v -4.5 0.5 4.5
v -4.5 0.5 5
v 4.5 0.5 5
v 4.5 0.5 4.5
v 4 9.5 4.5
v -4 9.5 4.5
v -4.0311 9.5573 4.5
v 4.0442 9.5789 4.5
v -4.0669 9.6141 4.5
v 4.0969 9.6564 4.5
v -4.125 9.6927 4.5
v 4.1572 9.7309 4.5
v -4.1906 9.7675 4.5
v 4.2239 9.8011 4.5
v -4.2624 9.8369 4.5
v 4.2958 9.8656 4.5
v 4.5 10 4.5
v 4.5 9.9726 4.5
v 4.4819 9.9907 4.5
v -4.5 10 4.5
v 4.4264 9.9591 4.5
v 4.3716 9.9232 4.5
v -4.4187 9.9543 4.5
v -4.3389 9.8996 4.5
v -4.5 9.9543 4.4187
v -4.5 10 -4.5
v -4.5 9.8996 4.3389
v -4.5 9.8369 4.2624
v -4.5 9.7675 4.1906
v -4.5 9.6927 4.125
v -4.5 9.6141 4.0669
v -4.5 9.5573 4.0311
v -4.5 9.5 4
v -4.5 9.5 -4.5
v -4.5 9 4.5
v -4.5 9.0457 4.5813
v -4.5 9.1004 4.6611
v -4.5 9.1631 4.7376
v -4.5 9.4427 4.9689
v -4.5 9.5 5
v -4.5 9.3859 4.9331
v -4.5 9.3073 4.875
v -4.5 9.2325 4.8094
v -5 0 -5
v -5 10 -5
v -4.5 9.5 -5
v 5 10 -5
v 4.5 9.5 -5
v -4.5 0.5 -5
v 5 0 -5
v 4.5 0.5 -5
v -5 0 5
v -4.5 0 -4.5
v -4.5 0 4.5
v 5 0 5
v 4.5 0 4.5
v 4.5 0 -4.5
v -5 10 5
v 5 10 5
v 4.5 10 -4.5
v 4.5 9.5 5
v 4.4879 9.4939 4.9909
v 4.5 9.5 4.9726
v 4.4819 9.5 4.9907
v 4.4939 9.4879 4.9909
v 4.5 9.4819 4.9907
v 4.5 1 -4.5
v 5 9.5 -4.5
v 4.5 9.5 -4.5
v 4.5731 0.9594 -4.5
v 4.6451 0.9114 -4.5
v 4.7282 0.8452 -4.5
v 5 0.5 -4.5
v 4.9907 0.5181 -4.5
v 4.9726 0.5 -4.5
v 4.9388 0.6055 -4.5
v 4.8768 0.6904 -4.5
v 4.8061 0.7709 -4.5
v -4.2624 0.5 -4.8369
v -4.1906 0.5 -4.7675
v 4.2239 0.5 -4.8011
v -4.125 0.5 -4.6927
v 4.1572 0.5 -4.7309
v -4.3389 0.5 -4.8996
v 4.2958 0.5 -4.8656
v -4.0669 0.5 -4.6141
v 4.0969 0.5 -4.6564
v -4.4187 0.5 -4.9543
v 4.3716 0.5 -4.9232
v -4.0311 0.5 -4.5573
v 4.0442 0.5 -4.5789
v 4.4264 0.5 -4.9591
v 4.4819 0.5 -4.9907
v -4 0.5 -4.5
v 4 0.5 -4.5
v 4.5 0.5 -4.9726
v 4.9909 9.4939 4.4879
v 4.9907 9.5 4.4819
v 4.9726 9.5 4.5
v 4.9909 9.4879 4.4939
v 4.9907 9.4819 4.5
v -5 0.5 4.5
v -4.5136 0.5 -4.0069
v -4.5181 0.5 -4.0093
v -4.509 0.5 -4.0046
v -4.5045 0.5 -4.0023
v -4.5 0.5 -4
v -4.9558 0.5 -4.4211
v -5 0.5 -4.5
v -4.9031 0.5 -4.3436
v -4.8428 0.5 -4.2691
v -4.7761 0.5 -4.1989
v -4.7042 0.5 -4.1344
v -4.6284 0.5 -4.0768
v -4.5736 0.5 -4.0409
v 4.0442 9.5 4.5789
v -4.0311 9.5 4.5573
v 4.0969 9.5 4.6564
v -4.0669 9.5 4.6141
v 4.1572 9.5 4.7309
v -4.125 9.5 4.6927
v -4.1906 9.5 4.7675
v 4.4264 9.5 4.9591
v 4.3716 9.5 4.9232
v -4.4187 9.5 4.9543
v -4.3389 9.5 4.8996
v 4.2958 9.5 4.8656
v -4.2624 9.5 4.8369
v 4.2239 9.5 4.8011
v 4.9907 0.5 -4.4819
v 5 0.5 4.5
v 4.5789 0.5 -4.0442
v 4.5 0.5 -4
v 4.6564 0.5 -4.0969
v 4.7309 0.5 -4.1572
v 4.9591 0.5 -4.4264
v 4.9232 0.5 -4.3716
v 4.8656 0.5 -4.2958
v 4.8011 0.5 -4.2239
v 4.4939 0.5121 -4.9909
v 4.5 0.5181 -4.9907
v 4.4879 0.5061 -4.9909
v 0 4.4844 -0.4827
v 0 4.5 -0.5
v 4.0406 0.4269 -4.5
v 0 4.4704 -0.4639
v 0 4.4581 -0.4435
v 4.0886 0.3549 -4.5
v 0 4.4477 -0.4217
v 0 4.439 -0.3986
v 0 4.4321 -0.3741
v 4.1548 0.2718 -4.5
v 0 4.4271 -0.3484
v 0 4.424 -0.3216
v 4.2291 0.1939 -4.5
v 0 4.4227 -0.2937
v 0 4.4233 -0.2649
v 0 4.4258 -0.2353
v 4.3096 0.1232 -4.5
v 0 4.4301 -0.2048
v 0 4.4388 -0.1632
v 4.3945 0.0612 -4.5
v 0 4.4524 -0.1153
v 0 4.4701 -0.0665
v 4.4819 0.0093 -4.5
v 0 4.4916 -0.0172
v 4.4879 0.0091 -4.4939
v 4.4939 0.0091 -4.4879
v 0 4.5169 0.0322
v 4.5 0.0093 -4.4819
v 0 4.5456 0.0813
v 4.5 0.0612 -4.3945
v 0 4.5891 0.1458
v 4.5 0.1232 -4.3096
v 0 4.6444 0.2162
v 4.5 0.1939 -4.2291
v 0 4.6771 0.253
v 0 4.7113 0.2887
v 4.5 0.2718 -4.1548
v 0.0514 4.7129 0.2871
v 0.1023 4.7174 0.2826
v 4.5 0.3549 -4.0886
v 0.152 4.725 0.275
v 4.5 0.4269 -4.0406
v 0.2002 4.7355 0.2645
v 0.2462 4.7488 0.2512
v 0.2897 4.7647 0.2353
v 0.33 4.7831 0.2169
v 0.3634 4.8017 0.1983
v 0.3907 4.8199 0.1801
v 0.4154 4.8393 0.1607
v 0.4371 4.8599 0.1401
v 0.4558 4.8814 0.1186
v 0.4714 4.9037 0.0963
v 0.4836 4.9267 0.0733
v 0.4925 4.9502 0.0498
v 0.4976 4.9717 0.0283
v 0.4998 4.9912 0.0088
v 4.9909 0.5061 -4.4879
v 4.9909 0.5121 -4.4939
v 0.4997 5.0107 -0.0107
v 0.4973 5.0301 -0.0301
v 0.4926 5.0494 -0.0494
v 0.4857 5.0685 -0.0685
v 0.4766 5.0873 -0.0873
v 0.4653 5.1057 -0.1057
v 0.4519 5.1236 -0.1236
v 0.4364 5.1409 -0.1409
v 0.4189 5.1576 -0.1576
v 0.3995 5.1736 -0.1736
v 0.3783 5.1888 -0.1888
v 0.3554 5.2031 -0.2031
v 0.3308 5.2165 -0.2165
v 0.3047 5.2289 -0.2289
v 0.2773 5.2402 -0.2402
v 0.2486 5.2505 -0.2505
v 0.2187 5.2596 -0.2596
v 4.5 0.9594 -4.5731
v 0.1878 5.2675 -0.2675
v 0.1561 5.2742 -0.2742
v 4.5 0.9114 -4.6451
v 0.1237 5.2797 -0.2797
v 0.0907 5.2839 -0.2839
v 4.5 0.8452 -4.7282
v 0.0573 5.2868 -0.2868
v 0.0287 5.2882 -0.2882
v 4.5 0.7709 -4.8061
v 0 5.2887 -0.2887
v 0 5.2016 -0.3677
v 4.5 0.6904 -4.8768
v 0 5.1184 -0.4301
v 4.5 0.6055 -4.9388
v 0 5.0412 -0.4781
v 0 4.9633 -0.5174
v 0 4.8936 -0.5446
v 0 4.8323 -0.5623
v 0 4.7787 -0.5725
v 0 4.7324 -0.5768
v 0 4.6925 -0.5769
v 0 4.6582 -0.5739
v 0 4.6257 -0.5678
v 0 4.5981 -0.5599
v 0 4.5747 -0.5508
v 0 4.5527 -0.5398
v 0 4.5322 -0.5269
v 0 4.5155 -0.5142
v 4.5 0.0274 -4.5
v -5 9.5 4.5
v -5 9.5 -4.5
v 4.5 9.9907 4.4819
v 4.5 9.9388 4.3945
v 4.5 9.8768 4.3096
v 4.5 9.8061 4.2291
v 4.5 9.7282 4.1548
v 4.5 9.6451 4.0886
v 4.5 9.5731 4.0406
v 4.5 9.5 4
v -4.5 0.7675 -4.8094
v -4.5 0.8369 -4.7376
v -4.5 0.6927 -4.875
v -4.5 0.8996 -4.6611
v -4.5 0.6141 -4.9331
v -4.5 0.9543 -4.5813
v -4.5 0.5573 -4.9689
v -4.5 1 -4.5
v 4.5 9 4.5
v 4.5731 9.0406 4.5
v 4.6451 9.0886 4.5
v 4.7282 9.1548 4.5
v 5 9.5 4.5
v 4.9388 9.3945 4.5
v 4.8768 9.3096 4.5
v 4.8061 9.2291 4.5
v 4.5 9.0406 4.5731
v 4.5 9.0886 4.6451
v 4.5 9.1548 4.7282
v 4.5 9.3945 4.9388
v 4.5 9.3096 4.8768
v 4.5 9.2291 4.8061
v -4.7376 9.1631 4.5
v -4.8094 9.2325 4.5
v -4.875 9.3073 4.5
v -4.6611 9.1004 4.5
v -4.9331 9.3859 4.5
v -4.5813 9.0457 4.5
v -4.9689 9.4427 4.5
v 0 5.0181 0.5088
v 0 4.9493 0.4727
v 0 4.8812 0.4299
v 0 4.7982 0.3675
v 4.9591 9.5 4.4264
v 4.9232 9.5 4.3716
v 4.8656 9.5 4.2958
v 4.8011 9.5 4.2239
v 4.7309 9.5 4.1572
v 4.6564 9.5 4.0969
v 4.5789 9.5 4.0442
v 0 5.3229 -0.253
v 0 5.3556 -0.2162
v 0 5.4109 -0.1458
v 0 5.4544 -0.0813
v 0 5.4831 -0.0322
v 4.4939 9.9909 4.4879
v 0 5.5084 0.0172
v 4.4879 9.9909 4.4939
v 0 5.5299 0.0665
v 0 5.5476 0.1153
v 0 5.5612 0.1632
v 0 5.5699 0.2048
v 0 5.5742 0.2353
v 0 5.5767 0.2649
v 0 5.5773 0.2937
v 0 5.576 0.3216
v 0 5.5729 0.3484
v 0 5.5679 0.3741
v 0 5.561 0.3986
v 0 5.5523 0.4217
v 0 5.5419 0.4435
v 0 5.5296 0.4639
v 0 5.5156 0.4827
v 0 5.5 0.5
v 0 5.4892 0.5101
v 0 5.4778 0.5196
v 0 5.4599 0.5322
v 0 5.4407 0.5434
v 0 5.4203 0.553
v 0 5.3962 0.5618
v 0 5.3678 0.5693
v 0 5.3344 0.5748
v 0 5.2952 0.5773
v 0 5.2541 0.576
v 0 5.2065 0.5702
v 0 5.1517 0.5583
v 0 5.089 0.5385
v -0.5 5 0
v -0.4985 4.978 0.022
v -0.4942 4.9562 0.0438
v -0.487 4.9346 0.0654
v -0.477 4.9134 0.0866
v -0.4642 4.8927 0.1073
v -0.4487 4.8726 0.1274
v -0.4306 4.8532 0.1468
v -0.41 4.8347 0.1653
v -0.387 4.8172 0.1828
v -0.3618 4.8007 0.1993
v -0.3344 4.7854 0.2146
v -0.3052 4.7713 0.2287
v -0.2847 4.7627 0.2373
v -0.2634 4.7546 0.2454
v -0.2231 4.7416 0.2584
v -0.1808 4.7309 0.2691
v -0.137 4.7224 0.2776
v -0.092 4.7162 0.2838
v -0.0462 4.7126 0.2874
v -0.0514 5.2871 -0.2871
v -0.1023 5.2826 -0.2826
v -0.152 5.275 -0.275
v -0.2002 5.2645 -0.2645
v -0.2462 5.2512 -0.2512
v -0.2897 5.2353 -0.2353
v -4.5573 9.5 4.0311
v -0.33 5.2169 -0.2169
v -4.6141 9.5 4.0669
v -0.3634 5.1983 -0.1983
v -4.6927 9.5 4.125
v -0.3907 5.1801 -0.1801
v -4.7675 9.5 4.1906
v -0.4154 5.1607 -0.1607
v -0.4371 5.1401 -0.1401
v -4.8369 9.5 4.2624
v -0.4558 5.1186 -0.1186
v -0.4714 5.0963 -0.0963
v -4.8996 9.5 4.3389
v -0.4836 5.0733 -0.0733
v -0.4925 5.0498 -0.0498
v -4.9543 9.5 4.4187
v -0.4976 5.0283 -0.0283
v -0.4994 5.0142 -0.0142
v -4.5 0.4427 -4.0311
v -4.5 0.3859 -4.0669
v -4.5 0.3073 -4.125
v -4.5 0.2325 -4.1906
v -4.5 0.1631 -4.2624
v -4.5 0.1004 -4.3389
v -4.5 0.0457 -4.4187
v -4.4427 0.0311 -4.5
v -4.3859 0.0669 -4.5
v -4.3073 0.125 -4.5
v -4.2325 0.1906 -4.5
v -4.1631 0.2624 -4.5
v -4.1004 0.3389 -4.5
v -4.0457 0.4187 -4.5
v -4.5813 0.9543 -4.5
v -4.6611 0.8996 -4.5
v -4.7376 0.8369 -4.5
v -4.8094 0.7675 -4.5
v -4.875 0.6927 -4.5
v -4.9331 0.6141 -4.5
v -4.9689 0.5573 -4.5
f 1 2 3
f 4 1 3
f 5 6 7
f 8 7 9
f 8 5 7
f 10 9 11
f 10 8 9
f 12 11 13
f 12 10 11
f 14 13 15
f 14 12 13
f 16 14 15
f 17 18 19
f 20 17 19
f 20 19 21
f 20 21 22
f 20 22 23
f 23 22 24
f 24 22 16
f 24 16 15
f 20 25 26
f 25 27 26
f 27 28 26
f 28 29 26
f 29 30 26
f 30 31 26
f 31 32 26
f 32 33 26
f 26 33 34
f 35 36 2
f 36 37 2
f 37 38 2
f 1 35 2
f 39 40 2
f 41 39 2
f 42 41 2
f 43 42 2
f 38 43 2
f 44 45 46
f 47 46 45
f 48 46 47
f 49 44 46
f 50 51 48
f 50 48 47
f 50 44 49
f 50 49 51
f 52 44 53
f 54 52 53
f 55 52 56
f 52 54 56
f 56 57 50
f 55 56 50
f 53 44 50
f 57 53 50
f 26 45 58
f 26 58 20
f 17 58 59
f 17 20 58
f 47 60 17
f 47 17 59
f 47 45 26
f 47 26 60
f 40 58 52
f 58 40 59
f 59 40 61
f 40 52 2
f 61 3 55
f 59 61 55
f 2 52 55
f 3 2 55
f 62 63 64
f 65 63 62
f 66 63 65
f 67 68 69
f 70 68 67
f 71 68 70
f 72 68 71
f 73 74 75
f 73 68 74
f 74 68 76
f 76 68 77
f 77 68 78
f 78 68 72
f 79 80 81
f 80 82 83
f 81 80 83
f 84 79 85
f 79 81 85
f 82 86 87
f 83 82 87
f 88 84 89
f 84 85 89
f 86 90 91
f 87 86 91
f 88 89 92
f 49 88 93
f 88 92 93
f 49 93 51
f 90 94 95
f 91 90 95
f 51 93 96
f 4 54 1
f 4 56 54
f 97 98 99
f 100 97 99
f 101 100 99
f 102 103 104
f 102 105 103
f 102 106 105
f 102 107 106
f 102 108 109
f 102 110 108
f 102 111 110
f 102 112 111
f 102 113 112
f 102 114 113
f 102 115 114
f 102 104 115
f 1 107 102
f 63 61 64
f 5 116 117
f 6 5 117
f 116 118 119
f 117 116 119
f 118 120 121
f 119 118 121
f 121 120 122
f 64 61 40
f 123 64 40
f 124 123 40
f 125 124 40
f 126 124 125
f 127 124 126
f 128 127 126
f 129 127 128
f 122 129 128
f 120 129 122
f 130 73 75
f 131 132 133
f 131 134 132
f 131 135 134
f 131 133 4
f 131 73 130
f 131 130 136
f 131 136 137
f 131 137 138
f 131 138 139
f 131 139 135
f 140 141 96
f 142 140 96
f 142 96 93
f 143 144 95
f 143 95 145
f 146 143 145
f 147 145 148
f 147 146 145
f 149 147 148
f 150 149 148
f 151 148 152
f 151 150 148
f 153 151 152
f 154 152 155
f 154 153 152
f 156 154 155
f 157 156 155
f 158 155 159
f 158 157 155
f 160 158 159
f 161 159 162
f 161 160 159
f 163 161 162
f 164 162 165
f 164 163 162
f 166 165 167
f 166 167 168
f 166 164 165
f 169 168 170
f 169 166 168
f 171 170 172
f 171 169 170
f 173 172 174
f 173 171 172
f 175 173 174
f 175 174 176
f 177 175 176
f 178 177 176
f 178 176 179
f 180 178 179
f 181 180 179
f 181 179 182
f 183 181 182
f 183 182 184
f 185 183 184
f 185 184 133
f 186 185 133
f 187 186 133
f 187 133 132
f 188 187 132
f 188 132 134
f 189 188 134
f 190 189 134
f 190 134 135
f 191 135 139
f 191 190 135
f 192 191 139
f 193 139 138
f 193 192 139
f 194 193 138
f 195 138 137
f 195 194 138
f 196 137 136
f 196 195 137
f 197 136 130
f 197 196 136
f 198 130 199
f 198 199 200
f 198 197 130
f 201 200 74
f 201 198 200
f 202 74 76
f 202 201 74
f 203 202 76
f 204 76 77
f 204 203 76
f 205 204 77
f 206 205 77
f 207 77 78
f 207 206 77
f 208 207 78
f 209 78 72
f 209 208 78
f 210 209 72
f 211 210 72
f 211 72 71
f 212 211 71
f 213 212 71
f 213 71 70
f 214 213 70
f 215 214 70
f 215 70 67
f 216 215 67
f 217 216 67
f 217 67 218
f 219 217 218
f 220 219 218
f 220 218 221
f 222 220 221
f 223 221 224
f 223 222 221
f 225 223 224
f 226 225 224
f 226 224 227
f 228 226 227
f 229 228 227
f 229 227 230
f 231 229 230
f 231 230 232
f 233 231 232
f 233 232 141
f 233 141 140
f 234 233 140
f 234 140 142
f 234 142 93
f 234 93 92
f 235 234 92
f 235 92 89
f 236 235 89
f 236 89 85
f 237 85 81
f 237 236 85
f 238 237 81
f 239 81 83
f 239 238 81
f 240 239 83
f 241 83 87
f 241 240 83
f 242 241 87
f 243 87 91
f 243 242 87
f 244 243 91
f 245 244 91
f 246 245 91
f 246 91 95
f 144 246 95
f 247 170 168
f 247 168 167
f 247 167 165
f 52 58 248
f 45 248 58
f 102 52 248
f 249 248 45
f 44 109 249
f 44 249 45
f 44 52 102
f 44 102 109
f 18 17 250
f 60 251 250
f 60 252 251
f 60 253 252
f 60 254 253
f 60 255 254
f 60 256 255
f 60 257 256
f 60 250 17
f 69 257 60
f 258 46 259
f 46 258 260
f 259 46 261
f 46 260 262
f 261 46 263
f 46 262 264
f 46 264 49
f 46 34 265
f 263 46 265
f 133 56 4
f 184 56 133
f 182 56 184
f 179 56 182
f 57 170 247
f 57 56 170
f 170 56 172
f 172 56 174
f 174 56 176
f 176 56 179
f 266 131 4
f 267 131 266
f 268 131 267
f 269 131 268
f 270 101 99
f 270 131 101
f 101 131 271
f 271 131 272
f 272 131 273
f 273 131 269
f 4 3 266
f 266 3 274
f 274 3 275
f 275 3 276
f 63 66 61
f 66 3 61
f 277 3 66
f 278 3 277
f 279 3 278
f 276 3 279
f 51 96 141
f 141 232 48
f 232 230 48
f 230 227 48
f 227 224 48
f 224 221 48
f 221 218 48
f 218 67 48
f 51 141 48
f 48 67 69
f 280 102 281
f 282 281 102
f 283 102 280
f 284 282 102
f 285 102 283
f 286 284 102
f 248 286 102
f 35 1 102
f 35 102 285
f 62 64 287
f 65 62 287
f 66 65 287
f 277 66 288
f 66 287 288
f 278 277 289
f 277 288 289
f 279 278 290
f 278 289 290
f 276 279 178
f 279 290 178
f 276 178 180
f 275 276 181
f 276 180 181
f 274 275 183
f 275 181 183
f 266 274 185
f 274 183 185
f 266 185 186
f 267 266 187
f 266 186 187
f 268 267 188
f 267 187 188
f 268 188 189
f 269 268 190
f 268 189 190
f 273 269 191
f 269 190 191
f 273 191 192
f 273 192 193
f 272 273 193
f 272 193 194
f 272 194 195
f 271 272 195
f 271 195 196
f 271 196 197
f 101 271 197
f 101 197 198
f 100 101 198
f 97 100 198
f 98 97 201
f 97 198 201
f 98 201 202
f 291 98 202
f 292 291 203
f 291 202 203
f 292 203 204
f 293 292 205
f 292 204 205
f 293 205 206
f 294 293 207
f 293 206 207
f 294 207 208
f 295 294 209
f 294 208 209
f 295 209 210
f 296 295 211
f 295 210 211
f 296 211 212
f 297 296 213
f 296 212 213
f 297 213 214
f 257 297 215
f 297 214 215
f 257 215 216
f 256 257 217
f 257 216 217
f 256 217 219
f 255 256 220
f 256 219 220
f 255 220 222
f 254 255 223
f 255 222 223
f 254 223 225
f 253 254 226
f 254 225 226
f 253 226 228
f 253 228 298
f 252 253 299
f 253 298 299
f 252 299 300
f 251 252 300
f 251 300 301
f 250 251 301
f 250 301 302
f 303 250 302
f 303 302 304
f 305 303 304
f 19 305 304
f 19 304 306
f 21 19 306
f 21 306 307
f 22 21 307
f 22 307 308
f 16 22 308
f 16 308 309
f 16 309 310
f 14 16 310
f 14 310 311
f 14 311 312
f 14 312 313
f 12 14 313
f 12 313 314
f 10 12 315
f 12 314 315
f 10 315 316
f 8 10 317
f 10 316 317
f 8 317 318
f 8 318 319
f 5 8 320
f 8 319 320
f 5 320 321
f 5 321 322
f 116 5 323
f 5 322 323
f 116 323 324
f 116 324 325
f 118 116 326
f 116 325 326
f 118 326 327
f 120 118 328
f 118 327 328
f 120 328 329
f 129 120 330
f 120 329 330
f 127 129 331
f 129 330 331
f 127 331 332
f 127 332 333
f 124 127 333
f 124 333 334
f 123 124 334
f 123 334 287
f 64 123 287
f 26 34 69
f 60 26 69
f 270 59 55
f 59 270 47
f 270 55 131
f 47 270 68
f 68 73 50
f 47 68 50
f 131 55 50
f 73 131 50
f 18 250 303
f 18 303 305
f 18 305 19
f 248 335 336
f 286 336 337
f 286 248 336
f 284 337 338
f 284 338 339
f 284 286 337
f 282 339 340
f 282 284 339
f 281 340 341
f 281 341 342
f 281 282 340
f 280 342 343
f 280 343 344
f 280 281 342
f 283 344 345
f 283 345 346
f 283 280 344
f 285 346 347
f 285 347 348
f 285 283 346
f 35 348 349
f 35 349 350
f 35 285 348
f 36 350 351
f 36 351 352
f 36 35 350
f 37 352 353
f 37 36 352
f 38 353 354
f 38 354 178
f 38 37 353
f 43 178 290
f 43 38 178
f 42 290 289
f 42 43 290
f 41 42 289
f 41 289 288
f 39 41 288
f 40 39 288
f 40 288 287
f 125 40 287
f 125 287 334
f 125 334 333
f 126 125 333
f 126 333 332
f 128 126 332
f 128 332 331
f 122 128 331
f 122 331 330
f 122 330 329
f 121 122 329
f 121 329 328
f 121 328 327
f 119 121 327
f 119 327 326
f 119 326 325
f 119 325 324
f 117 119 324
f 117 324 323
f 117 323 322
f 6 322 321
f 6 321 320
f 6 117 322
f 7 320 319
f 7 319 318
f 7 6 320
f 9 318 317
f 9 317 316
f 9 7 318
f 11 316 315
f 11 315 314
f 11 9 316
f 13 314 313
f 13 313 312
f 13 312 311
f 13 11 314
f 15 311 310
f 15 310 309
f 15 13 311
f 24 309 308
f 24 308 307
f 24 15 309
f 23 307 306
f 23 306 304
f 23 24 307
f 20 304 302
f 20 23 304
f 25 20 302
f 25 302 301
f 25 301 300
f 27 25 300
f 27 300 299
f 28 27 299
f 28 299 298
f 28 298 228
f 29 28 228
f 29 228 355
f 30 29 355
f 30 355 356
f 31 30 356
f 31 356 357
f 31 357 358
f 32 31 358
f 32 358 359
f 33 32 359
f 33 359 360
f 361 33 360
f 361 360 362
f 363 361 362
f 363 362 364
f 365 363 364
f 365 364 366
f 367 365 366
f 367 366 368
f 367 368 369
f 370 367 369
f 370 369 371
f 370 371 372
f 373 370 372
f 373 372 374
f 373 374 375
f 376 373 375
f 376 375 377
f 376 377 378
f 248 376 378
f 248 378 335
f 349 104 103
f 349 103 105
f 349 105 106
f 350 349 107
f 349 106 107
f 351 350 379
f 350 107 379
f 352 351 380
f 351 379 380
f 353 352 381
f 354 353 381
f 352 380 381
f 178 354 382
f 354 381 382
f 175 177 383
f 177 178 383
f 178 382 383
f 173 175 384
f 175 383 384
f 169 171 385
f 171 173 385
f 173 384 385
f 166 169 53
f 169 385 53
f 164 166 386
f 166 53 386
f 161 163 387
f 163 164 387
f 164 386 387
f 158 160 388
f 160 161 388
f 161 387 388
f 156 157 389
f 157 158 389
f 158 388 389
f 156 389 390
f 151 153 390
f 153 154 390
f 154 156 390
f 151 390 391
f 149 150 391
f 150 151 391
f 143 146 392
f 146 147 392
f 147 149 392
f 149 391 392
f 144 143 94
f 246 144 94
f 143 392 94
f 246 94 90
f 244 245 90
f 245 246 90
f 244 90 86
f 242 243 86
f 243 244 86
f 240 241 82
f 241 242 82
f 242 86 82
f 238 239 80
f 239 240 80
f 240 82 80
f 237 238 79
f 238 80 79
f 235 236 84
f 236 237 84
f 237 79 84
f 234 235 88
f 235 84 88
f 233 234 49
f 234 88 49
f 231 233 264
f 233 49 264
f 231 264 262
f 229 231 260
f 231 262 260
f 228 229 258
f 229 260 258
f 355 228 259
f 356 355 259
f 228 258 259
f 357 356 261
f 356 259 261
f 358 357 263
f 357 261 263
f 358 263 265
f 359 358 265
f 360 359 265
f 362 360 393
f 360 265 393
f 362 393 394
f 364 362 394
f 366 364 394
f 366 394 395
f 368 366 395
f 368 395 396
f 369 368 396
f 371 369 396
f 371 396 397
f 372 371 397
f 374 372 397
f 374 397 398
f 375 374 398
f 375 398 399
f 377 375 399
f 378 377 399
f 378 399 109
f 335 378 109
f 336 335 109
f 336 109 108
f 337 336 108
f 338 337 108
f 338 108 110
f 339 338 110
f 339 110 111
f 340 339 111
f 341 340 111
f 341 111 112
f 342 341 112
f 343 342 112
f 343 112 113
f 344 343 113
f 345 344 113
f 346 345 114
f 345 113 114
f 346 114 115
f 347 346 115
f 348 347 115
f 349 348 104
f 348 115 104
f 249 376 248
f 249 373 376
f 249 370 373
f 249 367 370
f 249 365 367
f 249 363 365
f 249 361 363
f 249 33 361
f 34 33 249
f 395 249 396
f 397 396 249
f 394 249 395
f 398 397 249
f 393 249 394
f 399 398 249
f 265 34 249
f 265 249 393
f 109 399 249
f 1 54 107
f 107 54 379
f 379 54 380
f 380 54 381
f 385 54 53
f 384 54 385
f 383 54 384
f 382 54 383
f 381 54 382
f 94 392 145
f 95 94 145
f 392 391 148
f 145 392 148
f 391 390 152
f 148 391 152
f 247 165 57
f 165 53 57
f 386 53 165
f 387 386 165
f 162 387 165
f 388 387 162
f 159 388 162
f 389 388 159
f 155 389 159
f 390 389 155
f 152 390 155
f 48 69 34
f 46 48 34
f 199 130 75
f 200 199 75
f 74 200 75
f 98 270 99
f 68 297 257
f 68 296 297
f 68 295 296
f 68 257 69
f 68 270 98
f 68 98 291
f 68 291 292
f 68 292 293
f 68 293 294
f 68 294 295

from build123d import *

# Parameters (mm, degrees)
SKETCH1_W           = 10
SKETCH1_H           = 10
BOSS_EXTRUDE1_DEPTH = 10
SHELL2_T            = -0.5
CUT_EXTRUDE1_DEPTH  = 17.748134224
CUT_EXTRUDE2_DEPTH  = 17.748134224
SKETCH5_R           = 0.40824829
BOSS_EXTRUDE6_DEPTH = 16.15
SKETCH9_R           = 0.40824829
BOSS_EXTRUDE5_DEPTH = 16.15


with BuildPart() as part:
    # Sketch1 → Boss-Extrude1 (new body)
    with BuildSketch(Plane(origin=(0, 0, 0), x_dir=(1, 0, 0), z_dir=(0, 1, 0))):
        Rectangle(SKETCH1_W, SKETCH1_H)
    extrude(amount=BOSS_EXTRUDE1_DEPTH)

    # Shell2
    shell2_openings = [part.faces().sort_by_distance(p)[0] for p in [
        (0, 0, 0),
        (0, 10, 0),
    ]]
    offset(amount=SHELL2_T, openings=shell2_openings, kind=Kind.INTERSECTION)

    # 3DSketch1 → Cut-Extrude1 (cut, through all)
    with BuildSketch(Plane(origin=(5, 9.5, 4.5), x_dir=(0, -0.7071067811865475, -0.7071067811865476), z_dir=(1, 0, 0))):
        Polygon((0, 0), (6.363961031, 6.363961031), (12.727922061, 0), (6.363961031, -6.363961031), align=None)
    extrude(amount=-CUT_EXTRUDE1_DEPTH, mode=Mode.SUBTRACT)

    # 3DSketch2 → Cut-Extrude2 (cut, through all)
    with BuildSketch(Plane(origin=(-4.5, 9.5, 5), x_dir=(0.7071067811865476, -0.7071067811865475, 0), z_dir=(0, 0, -1))):
        Polygon((0, 0), (6.363961031, 6.363961031), (12.727922061, 0), (6.363961031, -6.363961031), align=None)
    extrude(amount=CUT_EXTRUDE2_DEPTH, mode=Mode.SUBTRACT)

    # Sketch5 → Boss-Extrude6 (add)
    with BuildSketch(Plane(origin=(-6.333333333, 6.333333333, 6.333333333), x_dir=(0.816496580927726, 0.4082482904638632, 0.4082482904638628), z_dir=(-0.5773502691896257, 0.5773502691896262, 0.5773502691896255))):
        with Locations(Location((2.041241452, 3.535533906, 0), (0, 0, 180))):
            Circle(SKETCH5_R)
    extrude(amount=-BOSS_EXTRUDE6_DEPTH)

    # Sketch9 → Boss-Extrude5 (add)
    with BuildSketch(Plane(origin=(-3, -3, -3), x_dir=(0.8164965809277259, -0.4082482904638629, -0.4082482904638633), z_dir=(0.577350269189626, 0.5773502691896255, 0.577350269189626))):
        with Locations(Location((-2.041241452, 3.535533906, 0), (0, 0, 238.204536501))):
            Circle(SKETCH9_R)
    extrude(amount=BOSS_EXTRUDE5_DEPTH)


solid = part.part
